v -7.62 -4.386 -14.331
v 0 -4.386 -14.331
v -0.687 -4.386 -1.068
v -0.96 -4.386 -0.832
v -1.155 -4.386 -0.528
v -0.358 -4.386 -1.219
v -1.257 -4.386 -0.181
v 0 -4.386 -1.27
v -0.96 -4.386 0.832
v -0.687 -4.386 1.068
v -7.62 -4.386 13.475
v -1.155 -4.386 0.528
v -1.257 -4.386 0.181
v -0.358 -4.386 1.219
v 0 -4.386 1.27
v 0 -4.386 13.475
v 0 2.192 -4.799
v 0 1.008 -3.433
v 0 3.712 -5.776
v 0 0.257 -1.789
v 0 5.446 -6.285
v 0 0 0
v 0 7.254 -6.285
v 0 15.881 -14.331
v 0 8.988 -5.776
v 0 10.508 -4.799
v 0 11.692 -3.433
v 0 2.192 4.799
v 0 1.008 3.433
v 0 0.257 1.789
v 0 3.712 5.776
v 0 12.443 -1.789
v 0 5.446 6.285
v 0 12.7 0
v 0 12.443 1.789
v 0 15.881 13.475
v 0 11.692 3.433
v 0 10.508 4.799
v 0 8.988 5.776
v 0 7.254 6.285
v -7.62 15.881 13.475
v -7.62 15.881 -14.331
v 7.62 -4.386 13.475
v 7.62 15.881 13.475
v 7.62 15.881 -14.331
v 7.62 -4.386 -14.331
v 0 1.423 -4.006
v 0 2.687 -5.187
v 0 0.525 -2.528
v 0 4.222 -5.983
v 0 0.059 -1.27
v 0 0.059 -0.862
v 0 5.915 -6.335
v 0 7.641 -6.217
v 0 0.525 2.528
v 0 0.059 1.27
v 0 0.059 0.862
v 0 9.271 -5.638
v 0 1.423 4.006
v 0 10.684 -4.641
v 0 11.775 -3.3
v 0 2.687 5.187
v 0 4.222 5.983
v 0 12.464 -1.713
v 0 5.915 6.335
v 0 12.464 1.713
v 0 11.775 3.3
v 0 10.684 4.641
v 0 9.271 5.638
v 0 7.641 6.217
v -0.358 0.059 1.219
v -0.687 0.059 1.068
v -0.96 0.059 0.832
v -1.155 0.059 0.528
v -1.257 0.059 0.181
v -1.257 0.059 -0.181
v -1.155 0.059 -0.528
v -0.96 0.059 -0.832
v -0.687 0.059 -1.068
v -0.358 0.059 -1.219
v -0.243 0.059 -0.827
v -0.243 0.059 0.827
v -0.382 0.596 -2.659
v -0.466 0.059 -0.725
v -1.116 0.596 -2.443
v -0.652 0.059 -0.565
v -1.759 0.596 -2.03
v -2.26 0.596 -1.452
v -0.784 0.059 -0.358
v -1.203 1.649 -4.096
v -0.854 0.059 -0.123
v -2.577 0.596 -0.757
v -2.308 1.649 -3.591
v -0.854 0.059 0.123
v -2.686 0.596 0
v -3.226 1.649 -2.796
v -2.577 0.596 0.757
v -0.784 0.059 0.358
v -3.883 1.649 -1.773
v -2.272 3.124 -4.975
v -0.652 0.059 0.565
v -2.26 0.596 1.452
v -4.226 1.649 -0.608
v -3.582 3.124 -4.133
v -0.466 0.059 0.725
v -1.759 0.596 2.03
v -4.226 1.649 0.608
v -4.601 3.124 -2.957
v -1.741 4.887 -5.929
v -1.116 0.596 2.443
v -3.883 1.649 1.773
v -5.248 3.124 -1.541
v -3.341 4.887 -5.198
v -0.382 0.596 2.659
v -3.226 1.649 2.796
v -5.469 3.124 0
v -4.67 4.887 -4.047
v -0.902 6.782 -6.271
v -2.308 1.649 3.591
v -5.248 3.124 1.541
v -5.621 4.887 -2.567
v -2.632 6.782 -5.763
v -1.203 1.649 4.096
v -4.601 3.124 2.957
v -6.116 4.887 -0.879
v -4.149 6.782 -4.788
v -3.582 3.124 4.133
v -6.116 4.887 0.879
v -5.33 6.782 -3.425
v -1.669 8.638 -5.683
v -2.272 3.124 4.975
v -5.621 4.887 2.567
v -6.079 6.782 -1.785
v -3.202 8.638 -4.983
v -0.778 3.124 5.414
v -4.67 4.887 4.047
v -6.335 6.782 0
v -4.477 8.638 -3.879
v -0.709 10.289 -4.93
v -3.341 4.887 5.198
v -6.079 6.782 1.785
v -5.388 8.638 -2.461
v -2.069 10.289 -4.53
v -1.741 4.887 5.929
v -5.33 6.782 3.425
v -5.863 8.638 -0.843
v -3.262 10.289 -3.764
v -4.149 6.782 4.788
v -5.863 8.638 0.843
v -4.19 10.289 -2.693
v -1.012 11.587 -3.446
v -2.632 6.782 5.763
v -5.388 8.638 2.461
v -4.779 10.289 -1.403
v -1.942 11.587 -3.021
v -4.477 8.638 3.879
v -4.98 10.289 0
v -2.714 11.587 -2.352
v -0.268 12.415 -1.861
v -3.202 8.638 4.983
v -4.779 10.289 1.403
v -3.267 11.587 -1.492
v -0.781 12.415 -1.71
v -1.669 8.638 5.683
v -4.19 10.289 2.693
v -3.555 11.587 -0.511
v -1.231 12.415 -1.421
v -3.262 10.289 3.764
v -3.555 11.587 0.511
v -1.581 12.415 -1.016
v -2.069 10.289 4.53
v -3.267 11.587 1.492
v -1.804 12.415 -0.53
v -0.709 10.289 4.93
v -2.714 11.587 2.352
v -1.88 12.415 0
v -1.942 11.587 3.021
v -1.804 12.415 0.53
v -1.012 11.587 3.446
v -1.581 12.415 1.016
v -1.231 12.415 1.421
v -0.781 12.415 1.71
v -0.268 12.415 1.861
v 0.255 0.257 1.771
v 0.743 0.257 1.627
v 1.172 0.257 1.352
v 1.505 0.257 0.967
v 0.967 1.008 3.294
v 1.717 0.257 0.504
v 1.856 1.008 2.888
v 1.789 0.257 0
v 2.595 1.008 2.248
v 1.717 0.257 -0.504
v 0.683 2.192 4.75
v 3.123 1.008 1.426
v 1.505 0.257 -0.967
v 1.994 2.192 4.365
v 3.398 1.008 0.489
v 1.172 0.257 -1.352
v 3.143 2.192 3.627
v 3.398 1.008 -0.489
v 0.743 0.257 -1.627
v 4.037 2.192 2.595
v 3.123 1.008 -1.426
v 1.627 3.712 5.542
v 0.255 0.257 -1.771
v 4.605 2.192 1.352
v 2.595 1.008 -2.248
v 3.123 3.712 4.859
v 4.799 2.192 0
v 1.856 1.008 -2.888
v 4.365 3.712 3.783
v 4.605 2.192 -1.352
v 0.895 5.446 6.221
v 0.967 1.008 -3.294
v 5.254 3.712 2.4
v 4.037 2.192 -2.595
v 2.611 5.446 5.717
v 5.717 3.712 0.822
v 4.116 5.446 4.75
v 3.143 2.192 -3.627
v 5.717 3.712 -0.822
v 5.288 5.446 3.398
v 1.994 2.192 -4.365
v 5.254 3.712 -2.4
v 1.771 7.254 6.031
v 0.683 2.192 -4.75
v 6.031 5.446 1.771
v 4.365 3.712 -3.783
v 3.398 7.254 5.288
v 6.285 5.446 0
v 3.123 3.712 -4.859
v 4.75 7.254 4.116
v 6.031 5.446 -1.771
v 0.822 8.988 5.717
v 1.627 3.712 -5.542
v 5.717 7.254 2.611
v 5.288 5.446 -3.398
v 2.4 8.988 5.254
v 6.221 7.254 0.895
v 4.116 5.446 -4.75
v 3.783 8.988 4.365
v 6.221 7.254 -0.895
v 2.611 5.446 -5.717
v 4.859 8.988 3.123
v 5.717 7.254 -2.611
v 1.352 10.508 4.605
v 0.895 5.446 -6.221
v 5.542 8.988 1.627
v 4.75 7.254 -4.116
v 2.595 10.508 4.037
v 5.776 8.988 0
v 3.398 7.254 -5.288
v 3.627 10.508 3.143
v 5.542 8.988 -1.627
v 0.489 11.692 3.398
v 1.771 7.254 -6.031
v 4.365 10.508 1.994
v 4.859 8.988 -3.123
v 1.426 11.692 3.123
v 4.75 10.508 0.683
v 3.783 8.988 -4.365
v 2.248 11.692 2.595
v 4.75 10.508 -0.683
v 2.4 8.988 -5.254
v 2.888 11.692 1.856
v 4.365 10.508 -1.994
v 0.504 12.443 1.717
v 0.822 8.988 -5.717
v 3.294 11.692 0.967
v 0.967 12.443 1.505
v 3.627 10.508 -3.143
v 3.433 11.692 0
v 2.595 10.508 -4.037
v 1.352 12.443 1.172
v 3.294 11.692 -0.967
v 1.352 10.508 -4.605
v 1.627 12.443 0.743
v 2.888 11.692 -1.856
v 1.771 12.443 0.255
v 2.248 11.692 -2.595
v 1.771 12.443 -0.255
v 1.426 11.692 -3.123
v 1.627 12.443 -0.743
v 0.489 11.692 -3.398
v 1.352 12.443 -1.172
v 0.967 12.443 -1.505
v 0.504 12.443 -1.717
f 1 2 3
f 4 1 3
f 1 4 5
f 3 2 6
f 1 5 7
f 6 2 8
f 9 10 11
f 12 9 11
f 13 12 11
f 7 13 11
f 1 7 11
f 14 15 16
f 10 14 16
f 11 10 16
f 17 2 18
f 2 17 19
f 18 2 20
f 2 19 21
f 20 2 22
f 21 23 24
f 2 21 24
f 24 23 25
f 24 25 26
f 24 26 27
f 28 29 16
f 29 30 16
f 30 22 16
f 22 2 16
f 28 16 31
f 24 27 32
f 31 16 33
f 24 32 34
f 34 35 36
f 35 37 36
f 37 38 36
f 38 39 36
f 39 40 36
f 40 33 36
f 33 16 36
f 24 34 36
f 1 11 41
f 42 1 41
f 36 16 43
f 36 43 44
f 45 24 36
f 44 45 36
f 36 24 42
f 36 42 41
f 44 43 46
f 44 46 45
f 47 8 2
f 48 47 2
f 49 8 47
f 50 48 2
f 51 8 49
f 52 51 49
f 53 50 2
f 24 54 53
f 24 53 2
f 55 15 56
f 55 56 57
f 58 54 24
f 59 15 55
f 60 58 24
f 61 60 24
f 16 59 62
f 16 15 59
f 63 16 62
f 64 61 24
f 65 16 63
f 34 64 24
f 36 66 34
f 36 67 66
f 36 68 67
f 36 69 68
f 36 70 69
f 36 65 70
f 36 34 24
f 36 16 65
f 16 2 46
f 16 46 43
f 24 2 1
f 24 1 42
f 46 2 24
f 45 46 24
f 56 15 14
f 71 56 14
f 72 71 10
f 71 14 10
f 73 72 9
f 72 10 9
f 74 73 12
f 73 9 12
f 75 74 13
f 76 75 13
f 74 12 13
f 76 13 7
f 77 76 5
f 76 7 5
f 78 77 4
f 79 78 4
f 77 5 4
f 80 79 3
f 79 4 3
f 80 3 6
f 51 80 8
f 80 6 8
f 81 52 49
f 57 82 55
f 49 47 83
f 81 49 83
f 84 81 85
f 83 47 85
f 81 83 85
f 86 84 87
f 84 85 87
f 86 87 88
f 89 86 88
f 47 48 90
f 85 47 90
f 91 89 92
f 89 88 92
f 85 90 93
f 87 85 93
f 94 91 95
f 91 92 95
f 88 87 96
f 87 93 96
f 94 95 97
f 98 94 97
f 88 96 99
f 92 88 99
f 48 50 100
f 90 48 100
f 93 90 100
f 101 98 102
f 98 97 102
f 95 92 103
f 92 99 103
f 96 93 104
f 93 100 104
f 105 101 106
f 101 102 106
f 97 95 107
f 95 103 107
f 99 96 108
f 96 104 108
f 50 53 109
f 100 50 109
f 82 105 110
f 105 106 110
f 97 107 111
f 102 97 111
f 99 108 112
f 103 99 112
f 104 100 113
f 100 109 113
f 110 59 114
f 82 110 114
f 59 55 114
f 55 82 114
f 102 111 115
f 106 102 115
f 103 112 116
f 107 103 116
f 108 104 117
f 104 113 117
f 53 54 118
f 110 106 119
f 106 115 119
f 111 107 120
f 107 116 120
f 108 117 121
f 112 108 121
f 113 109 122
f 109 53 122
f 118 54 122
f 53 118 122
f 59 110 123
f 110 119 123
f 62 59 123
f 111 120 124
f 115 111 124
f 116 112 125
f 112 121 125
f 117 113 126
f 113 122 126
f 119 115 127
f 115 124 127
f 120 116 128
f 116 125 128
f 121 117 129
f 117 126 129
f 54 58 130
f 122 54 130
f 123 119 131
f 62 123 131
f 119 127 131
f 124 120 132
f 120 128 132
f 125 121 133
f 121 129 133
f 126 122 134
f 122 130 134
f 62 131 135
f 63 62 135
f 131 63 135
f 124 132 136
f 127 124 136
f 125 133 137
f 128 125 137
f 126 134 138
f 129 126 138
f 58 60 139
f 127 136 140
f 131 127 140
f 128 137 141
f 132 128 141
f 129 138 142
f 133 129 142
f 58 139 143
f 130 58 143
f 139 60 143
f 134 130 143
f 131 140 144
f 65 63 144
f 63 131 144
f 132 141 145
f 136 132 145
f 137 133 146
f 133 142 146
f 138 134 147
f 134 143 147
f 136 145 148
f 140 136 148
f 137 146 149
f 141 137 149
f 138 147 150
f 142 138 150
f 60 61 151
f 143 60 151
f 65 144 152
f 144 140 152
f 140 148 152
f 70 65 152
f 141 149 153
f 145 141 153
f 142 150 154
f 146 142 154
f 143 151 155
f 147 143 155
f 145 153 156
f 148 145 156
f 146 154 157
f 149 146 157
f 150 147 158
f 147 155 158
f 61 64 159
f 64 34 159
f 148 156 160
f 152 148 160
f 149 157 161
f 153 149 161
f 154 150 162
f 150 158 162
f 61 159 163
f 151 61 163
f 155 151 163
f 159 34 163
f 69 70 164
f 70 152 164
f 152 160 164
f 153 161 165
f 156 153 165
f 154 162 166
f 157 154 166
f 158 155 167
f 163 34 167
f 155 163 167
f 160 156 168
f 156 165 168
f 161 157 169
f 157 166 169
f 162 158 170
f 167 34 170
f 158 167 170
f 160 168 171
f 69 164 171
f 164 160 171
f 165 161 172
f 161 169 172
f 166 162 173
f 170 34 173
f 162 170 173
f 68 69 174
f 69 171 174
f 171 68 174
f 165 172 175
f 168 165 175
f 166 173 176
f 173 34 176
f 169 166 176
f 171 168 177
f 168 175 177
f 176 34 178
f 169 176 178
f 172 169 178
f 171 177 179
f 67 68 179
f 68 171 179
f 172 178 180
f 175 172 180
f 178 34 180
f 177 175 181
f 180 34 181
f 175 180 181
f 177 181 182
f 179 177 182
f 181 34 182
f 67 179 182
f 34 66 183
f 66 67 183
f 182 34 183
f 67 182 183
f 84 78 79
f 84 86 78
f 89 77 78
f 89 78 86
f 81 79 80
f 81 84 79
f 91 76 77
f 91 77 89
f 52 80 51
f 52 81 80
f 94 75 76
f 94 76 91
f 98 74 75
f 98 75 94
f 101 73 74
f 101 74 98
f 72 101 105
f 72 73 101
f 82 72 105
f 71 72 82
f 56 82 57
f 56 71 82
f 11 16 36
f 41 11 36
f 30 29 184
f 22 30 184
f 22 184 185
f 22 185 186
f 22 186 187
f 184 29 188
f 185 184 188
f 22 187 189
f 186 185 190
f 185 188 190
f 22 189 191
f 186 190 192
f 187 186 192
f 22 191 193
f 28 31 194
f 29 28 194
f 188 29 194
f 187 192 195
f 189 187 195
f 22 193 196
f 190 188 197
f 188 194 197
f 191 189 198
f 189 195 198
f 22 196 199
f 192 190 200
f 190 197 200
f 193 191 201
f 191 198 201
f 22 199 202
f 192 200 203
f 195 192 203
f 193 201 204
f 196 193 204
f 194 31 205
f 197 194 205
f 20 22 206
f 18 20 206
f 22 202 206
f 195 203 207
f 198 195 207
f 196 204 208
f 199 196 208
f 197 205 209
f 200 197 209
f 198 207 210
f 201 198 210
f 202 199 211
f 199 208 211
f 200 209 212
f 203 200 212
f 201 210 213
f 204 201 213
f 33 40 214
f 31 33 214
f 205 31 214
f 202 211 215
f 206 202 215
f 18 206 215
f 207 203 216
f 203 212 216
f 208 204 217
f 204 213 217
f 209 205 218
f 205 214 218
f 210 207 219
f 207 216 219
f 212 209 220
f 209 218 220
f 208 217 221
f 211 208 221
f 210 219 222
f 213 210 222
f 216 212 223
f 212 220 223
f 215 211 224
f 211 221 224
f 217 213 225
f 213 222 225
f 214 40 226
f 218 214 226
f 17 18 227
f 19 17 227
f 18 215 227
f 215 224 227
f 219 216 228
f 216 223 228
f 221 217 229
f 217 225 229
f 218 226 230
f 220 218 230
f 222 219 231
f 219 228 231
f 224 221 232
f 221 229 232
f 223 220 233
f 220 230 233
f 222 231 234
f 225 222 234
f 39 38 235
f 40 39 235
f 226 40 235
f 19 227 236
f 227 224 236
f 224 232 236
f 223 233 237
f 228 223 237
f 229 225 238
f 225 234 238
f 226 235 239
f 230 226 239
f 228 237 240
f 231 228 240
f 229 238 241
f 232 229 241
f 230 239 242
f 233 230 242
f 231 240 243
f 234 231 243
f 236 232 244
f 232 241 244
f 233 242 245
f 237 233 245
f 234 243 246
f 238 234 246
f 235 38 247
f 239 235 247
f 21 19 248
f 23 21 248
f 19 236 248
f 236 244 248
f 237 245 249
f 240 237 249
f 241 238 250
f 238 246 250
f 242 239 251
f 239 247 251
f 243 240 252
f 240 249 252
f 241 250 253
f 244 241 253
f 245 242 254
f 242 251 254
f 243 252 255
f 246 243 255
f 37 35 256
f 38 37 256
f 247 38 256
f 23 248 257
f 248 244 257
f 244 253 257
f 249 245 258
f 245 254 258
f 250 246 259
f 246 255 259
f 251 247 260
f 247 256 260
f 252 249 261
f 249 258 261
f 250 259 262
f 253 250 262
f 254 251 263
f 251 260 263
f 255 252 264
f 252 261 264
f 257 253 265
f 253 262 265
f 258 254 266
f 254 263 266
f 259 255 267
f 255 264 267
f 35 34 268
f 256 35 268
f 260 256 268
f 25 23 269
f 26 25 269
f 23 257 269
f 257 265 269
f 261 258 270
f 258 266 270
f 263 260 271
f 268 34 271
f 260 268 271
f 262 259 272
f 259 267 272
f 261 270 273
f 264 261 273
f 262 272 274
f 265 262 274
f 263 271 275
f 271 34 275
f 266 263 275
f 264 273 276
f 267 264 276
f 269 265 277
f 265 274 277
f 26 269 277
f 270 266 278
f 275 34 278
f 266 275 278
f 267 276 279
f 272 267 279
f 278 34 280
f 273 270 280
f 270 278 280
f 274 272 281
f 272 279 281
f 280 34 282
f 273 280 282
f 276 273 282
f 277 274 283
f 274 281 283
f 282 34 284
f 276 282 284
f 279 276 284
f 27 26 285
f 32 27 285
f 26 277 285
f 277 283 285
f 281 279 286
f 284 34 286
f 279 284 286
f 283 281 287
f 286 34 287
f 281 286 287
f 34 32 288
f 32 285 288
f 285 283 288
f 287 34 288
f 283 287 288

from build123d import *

# Parameters (mm, degrees)
F2_W     = 20.2671834268
F2_H     = 27.8065428138
F3_DEPTH = 7.62
F4_DEPTH = 7.62
F7_DEPTH = 4.445


# Not quite as in the source:
# - after a boolean that leaves OpenCascade's solid faulty, fix() repairs it


with BuildPart() as f1:
    # F0 (on Top) → F1 (revolve)
    with BuildSketch(Plane.XY):
        with BuildLine():
            Line((0, 12.7), (0, 0))
            ThreePointArc((0, 0), (6.35, 6.35), (0, 12.7))
        make_face()
    revolve(axis=Axis((0, 6.35, 0), (0, 1, 0)))


with BuildPart() as f3:
    # F2 (on Right) → F3 (new body)
    with BuildSketch(Plane.YZ):
        with Locations((5.7474102359, -0.4277937114)):
            Rectangle(F2_W, F2_H)
    extrude(amount=F3_DEPTH)

    # F5: cut F1
    add(f1.part, mode=Mode.SUBTRACT)

    add(f3.part.fix(), mode=Mode.REPLACE)


with BuildPart() as f4:
    # F2 (on Right) → F4 (new body)
    with BuildSketch(Plane.YZ):
        with Locations((5.7474102359, -0.4277937114)):
            Rectangle(F2_W, F2_H)
    extrude(amount=-F4_DEPTH)

    # F5: cut F1
    add(f1.part, mode=Mode.SUBTRACT)

    # F6 (on face) → F7 (cut)
    with BuildSketch(Plane.XZ.offset(4.3861814775)):
        with BuildLine():
            ThreePointArc((0, 1.27), (-1.27, 0), (0, -1.27))
            Line((0, -1.27), (0, 1.27))
        make_face()
    extrude(amount=-F7_DEPTH, mode=Mode.SUBTRACT)


solid = Compound([f3.part, f4.part])
